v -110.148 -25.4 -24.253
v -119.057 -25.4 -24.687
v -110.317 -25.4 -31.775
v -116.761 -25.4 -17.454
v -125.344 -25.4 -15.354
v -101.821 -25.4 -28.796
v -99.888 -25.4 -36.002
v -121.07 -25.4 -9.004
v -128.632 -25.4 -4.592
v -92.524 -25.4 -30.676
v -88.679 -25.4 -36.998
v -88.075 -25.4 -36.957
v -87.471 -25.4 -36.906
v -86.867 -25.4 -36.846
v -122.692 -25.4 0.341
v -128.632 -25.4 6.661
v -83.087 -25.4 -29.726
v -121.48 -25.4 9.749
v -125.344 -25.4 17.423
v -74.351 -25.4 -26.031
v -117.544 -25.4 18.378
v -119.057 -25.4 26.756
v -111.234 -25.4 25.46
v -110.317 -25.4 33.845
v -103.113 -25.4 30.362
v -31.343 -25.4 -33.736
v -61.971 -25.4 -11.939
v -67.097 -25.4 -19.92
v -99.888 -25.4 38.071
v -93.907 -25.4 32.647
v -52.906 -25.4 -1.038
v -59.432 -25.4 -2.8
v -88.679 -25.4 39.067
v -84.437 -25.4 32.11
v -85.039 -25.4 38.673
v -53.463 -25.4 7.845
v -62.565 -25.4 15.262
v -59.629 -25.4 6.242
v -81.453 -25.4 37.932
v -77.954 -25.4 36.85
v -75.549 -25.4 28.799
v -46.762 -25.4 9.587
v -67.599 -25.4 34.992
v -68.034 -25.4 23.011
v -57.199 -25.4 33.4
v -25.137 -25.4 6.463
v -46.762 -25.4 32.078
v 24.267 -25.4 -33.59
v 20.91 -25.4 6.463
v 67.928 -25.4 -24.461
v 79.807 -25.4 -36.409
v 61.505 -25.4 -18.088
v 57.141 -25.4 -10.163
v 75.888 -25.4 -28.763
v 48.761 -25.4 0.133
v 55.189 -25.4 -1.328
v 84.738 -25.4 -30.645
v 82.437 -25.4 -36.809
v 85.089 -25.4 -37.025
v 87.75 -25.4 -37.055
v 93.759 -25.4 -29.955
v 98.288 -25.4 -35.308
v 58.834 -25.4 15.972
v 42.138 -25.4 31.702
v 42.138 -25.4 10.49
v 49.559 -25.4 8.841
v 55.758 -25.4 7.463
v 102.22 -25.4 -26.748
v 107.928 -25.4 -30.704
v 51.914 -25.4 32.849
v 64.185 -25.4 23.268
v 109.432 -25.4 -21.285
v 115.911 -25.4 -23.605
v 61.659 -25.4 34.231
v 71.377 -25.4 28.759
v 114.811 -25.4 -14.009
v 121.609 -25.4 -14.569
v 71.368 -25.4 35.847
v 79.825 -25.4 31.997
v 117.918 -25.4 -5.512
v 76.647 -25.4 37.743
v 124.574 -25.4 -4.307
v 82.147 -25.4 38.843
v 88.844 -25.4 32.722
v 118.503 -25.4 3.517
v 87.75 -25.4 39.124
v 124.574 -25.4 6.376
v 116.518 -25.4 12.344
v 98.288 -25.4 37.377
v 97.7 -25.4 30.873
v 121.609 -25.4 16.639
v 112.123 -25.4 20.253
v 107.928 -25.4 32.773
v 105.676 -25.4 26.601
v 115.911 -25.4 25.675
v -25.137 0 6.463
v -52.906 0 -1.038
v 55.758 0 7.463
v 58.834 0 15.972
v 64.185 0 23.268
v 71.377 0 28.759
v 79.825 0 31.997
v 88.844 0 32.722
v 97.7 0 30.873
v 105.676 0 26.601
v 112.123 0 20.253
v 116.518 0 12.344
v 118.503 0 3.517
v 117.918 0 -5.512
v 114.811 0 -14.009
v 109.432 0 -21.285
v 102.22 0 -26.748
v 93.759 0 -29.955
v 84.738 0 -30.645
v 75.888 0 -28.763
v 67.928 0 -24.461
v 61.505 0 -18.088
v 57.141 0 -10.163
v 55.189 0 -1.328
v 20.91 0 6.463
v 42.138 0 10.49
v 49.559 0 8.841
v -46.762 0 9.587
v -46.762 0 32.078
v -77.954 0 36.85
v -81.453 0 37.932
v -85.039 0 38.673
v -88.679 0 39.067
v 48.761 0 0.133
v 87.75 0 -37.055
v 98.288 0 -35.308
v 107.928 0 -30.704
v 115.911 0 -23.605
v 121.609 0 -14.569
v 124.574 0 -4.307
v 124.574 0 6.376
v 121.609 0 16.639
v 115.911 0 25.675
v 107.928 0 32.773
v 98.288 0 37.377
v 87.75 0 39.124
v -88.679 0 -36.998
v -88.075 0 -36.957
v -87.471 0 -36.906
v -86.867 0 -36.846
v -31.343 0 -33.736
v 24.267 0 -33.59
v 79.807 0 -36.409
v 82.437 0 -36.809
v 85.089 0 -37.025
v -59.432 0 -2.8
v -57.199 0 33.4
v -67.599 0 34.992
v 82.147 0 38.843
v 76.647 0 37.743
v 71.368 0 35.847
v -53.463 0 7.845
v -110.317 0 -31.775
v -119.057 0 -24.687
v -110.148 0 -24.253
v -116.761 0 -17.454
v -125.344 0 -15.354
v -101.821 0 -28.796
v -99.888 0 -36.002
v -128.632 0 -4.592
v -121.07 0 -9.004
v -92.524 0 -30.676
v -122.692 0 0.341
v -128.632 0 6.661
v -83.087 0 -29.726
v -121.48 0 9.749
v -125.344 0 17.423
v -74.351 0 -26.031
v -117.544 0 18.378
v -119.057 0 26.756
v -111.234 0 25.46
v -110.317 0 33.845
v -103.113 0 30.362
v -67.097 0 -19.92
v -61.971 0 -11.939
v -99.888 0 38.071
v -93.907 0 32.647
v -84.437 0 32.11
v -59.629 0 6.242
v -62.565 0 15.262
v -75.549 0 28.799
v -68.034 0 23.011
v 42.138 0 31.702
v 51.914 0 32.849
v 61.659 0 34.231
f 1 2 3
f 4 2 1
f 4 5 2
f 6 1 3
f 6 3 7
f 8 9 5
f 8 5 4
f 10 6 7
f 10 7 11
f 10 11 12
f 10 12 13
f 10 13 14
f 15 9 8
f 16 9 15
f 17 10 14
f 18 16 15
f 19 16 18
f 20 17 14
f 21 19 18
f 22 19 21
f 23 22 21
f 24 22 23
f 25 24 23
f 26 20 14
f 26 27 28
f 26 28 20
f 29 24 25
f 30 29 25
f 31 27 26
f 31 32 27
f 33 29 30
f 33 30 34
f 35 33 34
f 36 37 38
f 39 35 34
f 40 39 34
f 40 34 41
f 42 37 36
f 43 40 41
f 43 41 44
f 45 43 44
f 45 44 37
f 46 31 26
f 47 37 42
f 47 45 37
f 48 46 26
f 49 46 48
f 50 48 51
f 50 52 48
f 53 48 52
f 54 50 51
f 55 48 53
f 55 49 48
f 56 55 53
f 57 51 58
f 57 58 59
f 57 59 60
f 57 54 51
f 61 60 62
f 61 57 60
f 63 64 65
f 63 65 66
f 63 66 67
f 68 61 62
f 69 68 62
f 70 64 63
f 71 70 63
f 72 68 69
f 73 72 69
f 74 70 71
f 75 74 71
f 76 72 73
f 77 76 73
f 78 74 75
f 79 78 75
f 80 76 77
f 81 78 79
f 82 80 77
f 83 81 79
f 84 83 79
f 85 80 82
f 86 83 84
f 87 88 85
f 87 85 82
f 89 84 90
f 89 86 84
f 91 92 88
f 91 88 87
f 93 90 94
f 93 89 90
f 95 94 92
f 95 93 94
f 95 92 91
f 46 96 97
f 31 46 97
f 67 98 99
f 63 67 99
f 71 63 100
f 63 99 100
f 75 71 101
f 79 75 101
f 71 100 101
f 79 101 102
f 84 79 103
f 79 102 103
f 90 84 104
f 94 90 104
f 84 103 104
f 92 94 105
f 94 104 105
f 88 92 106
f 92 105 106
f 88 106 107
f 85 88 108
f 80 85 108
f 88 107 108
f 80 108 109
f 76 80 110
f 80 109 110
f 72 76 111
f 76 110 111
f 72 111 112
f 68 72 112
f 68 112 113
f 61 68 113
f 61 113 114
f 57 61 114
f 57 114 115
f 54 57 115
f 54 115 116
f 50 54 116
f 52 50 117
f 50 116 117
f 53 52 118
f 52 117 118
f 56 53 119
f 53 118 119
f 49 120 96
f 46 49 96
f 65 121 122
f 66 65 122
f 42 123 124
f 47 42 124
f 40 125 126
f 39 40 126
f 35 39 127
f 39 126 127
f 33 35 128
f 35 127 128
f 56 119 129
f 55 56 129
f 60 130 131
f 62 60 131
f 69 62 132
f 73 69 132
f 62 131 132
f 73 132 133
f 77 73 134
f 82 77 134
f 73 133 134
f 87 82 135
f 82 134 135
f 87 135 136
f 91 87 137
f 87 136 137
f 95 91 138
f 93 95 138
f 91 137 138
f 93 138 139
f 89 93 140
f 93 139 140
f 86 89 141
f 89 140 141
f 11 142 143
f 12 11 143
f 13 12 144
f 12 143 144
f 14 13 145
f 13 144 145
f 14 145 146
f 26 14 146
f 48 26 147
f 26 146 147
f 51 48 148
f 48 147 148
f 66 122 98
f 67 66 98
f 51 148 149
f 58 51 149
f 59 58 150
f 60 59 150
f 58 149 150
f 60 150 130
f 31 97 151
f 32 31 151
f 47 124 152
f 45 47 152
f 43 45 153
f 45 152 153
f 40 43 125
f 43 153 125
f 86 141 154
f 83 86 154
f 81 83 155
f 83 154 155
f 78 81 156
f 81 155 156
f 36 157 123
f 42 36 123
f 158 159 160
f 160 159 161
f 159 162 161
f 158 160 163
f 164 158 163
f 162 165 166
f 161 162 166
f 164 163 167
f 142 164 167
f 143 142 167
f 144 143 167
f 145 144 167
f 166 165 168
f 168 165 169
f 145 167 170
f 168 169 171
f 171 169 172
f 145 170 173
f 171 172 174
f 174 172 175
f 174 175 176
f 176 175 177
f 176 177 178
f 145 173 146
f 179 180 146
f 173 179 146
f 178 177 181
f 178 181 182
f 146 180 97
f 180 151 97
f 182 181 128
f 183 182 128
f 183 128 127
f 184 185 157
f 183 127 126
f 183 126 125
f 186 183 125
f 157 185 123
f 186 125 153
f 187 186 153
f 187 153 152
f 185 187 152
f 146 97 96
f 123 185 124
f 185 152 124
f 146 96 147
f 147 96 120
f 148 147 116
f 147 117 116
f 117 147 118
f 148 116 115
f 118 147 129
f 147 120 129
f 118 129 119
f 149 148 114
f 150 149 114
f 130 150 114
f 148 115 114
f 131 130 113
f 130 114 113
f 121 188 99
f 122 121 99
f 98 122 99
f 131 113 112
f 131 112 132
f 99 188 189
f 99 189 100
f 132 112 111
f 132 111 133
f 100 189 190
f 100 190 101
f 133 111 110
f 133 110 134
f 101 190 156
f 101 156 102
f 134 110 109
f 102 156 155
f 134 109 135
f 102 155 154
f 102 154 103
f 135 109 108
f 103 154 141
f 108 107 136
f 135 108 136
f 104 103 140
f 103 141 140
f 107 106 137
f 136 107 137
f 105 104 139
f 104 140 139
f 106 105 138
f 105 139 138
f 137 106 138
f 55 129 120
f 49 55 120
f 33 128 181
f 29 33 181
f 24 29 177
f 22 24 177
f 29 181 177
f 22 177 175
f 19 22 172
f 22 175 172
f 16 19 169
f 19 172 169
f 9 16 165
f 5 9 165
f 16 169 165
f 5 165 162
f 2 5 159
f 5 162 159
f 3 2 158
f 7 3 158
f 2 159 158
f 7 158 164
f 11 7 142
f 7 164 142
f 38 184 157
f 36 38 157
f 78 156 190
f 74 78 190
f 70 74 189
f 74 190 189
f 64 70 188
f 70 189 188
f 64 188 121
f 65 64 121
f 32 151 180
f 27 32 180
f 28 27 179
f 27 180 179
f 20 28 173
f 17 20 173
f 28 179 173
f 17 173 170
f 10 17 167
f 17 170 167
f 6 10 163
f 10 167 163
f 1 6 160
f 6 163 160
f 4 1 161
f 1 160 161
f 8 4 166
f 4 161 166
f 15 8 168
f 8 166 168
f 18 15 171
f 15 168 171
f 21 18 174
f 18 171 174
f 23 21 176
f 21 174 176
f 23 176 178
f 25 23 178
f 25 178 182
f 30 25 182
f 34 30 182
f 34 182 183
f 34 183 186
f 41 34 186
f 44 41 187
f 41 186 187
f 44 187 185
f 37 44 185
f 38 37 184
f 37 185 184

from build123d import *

# Parameters (mm, degrees)
F1_DEPTH = 25.4


with BuildPart() as f1:
    # F0 (on Front) → F1 (new body)
    with BuildSketch(Plane.XZ):
        with BuildLine():
            ThreePointArc((-77.954433, 36.849992), (-83.324328, 37.92253), (-88.679372, 39.066919))
            ThreePointArc((-88.679372, 39.066919), (-129.049346, 1.034601), (-88.679372, -36.997717))
            ThreePointArc((-88.679372, -36.997717), (-87.773383, -36.921511), (-86.867329, -36.846095))
            ThreePointArc((-86.867329, -36.846095), (-63.305117, -25.183839), (-52.905742, -1.037637))
            Line((-52.905742, -1.037637), (-59.431807, -2.8004))
            ThreePointArc((-59.431807, -2.8004), (-122.691774, 0.341231), (-59.62933, 6.242203))
            Line((-59.62933, 6.242203), (-53.462953, 7.844913))
            ThreePointArc((-53.462953, 7.844913), (-61.838966, 25.614996), (-77.954433, 36.849992))
        make_face()
        with BuildLine():
            ThreePointArc((-77.954433, 36.849992), (-83.236831, 38.345821), (-88.679372, 39.066919))
            ThreePointArc((-88.679372, 39.066919), (-83.324328, 37.92253), (-77.954433, 36.849992))
        make_face()
        with BuildLine():
            ThreePointArc((-86.867329, -36.846095), (-87.773383, -36.921511), (-88.679372, -36.997717))
            ThreePointArc((-88.679372, -36.997717), (-87.772445, -36.932718), (-86.867329, -36.846095))
        make_face()
        with BuildLine():
            ThreePointArc((-46.762083, 32.077556), (-62.404336, 34.162613), (-77.954433, 36.849992))
            ThreePointArc((-77.954433, 36.849992), (-61.838966, 25.614996), (-53.462953, 7.844913))
            Line((-53.462953, 7.844913), (-46.762083, 9.586544))
            Line((-46.762083, 9.586544), (-46.762083, 32.077556))
        make_face()
        with BuildLine():
            ThreePointArc((-52.905742, -1.037637), (-63.305117, -25.183839), (-86.867329, -36.846095))
            ThreePointArc((-86.867329, -36.846095), (-3.539116, -33.292767), (79.806603, -36.408574))
            ThreePointArc((79.806603, -36.408574), (57.814967, -23.63398), (48.761331, 0.132676))
            Line((48.761331, 0.132676), (20.909883, 6.46305))
            Line((20.909883, 6.46305), (-25.136846, 6.46305))
            Line((-25.136846, 6.46305), (-52.905742, -1.037637))
        make_face()
        with BuildLine():
            ThreePointArc((87.74957, -37.054793), (83.778703, -36.724097), (79.806603, -36.408574))
            ThreePointArc((79.806603, -36.408574), (83.761144, -36.939929), (87.74957, -37.054793))
        make_face()
        with BuildLine():
            ThreePointArc((48.761331, 0.132676), (57.814967, -23.63398), (79.806603, -36.408574))
            ThreePointArc((79.806603, -36.408574), (83.778703, -36.724097), (87.74957, -37.054793))
            ThreePointArc((87.74957, -37.054793), (124.950654, 1.034601), (87.74957, 39.123995))
            ThreePointArc((87.74957, 39.123995), (79.575458, 37.401709), (71.367851, 35.846852))
            ThreePointArc((71.367851, 35.846852), (57.209182, 24.971876), (49.558952, 8.840943))
            Line((49.558952, 8.840943), (55.758314, 7.463354))
            ThreePointArc((55.758314, 7.463354), (118.534221, -1.018226), (55.188695, -1.328204))
            Line((55.188695, -1.328204), (48.761331, 0.132676))
        make_face()
        with BuildLine():
            ThreePointArc((71.367851, 35.846852), (79.575458, 37.401709), (87.74957, 39.123995))
            ThreePointArc((87.74957, 39.123995), (79.376876, 38.394374), (71.367851, 35.846852))
        make_face()
        with BuildLine():
            ThreePointArc((49.558952, 8.840943), (57.209182, 24.971876), (71.367851, 35.846852))
            ThreePointArc((71.367851, 35.846852), (56.790326, 33.510204), (42.137917, 31.701597))
            Line((42.137917, 31.701597), (42.137917, 10.490005))
            Line((42.137917, 10.490005), (49.558952, 8.840943))
        make_face()
    extrude(amount=F1_DEPTH)


solid = f1.part
